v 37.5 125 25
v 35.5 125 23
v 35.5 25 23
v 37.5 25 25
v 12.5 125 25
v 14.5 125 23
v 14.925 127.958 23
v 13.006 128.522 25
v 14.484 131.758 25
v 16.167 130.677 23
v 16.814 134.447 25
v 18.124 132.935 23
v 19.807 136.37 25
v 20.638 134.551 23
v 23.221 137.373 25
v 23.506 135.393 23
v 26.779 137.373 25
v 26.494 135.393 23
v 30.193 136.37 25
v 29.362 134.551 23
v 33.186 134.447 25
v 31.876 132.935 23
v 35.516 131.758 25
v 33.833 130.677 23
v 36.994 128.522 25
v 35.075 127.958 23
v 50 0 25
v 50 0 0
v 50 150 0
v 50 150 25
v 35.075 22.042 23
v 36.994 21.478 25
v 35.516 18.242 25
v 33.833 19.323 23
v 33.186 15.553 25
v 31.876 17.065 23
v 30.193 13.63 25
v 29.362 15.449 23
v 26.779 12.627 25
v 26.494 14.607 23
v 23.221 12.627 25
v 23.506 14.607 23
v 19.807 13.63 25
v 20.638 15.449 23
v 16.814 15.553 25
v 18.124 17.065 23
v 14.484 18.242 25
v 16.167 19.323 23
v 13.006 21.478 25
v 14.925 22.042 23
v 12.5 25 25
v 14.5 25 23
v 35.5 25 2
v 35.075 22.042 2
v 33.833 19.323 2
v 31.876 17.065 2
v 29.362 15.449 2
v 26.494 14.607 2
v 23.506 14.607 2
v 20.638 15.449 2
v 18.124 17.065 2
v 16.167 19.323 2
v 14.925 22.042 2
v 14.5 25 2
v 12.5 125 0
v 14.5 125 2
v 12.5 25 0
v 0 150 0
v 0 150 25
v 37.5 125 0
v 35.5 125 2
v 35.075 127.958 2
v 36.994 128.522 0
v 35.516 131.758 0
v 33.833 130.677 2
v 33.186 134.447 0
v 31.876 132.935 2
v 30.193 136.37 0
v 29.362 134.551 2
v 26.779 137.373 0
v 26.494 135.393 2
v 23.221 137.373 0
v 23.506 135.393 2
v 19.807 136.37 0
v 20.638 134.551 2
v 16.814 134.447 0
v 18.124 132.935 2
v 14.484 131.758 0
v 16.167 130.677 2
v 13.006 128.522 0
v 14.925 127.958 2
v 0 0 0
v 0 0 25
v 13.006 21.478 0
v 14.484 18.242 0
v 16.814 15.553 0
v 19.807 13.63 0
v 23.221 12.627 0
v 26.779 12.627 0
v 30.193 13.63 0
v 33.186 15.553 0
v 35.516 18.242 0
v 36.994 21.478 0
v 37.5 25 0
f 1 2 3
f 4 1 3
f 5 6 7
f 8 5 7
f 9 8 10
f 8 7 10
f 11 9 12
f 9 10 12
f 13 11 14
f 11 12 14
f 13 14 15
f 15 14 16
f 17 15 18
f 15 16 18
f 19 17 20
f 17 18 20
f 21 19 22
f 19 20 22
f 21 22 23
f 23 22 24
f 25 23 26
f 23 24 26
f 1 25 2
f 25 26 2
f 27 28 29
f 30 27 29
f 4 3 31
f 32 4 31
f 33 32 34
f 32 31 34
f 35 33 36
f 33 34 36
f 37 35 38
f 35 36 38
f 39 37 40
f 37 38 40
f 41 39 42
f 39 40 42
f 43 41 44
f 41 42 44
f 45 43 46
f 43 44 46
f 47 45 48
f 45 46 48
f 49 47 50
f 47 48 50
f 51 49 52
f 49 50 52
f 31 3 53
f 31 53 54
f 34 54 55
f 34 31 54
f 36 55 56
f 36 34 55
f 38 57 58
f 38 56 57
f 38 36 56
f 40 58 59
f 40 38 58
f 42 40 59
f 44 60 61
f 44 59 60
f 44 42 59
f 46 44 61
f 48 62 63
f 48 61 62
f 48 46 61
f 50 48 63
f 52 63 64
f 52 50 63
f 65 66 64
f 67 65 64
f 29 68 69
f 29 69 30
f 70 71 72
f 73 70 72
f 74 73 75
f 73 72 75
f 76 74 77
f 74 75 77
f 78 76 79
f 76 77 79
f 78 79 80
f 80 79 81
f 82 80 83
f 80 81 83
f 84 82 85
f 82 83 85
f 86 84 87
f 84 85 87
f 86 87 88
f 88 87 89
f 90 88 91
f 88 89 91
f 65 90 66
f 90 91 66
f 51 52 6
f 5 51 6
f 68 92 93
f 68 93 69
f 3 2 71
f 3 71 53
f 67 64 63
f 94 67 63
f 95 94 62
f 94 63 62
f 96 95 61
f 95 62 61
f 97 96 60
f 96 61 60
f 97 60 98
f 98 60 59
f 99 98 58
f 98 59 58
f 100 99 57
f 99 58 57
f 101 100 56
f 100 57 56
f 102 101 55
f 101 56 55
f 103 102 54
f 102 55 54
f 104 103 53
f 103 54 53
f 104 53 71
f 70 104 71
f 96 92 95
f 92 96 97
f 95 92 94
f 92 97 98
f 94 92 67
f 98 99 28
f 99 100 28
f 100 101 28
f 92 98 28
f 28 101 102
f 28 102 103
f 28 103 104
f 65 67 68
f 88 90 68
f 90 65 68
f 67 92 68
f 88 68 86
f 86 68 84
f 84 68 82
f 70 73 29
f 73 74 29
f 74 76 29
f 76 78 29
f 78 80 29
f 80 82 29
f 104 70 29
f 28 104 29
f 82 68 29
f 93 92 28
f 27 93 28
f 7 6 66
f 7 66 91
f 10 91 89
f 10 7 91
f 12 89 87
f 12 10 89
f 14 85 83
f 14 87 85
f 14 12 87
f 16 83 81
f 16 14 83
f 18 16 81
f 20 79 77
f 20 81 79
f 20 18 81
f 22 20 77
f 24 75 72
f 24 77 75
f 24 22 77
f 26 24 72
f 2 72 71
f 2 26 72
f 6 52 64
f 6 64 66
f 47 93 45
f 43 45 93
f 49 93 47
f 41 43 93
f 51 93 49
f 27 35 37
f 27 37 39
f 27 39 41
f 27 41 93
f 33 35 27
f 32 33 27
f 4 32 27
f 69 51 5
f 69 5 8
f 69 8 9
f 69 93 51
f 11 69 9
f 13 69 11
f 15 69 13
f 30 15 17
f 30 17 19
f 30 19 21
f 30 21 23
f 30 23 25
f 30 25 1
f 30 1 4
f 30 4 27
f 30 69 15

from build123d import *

# Parameters (mm, degrees)
SKETCH_1_W          = 50
SKETCH_1_H          = 150
EXTRUDE_1_DEPTH     = 25
CUT_EXTRUDE_1_DEPTH = 26
CHAMFER_1_SIZE      = 2


with BuildPart() as part:
    # Эскиз1 → Бобышка-Вытянуть1 (new body)
    with BuildSketch(Plane.XY):
        with Locations((25, 75)):
            Rectangle(SKETCH_1_W, SKETCH_1_H)
    extrude(amount=EXTRUDE_1_DEPTH)

    # Эскиз2 → Вырез-Вытянуть1 (cut, through all)
    with BuildSketch(Plane.XY.offset(25)):
        with BuildLine():
            Line((35.5, 125), (35.5, 25))
            ThreePointArc((35.5, 25), (25, 14.5), (14.5, 25))
            Line((14.5, 25), (14.5, 125))
            ThreePointArc((14.5, 125), (25, 135.5), (35.5, 125))
        make_face()
    extrude(amount=-CUT_EXTRUDE_1_DEPTH, mode=Mode.SUBTRACT)

    # Фаска1
    chamfer_1_edges = [part.edges().sort_by_distance(p)[0] for p in [
        (25, 14.5, 0),
        (14.5, 75, 0),
        (25, 135.5, 0),
        (35.5, 75, 0),
        (25, 14.5, 25),
        (35.5, 75, 25),
        (25, 135.5, 25),
        (14.5, 75, 25),
    ]]
    chamfer(chamfer_1_edges, length=CHAMFER_1_SIZE)


solid = part.part
